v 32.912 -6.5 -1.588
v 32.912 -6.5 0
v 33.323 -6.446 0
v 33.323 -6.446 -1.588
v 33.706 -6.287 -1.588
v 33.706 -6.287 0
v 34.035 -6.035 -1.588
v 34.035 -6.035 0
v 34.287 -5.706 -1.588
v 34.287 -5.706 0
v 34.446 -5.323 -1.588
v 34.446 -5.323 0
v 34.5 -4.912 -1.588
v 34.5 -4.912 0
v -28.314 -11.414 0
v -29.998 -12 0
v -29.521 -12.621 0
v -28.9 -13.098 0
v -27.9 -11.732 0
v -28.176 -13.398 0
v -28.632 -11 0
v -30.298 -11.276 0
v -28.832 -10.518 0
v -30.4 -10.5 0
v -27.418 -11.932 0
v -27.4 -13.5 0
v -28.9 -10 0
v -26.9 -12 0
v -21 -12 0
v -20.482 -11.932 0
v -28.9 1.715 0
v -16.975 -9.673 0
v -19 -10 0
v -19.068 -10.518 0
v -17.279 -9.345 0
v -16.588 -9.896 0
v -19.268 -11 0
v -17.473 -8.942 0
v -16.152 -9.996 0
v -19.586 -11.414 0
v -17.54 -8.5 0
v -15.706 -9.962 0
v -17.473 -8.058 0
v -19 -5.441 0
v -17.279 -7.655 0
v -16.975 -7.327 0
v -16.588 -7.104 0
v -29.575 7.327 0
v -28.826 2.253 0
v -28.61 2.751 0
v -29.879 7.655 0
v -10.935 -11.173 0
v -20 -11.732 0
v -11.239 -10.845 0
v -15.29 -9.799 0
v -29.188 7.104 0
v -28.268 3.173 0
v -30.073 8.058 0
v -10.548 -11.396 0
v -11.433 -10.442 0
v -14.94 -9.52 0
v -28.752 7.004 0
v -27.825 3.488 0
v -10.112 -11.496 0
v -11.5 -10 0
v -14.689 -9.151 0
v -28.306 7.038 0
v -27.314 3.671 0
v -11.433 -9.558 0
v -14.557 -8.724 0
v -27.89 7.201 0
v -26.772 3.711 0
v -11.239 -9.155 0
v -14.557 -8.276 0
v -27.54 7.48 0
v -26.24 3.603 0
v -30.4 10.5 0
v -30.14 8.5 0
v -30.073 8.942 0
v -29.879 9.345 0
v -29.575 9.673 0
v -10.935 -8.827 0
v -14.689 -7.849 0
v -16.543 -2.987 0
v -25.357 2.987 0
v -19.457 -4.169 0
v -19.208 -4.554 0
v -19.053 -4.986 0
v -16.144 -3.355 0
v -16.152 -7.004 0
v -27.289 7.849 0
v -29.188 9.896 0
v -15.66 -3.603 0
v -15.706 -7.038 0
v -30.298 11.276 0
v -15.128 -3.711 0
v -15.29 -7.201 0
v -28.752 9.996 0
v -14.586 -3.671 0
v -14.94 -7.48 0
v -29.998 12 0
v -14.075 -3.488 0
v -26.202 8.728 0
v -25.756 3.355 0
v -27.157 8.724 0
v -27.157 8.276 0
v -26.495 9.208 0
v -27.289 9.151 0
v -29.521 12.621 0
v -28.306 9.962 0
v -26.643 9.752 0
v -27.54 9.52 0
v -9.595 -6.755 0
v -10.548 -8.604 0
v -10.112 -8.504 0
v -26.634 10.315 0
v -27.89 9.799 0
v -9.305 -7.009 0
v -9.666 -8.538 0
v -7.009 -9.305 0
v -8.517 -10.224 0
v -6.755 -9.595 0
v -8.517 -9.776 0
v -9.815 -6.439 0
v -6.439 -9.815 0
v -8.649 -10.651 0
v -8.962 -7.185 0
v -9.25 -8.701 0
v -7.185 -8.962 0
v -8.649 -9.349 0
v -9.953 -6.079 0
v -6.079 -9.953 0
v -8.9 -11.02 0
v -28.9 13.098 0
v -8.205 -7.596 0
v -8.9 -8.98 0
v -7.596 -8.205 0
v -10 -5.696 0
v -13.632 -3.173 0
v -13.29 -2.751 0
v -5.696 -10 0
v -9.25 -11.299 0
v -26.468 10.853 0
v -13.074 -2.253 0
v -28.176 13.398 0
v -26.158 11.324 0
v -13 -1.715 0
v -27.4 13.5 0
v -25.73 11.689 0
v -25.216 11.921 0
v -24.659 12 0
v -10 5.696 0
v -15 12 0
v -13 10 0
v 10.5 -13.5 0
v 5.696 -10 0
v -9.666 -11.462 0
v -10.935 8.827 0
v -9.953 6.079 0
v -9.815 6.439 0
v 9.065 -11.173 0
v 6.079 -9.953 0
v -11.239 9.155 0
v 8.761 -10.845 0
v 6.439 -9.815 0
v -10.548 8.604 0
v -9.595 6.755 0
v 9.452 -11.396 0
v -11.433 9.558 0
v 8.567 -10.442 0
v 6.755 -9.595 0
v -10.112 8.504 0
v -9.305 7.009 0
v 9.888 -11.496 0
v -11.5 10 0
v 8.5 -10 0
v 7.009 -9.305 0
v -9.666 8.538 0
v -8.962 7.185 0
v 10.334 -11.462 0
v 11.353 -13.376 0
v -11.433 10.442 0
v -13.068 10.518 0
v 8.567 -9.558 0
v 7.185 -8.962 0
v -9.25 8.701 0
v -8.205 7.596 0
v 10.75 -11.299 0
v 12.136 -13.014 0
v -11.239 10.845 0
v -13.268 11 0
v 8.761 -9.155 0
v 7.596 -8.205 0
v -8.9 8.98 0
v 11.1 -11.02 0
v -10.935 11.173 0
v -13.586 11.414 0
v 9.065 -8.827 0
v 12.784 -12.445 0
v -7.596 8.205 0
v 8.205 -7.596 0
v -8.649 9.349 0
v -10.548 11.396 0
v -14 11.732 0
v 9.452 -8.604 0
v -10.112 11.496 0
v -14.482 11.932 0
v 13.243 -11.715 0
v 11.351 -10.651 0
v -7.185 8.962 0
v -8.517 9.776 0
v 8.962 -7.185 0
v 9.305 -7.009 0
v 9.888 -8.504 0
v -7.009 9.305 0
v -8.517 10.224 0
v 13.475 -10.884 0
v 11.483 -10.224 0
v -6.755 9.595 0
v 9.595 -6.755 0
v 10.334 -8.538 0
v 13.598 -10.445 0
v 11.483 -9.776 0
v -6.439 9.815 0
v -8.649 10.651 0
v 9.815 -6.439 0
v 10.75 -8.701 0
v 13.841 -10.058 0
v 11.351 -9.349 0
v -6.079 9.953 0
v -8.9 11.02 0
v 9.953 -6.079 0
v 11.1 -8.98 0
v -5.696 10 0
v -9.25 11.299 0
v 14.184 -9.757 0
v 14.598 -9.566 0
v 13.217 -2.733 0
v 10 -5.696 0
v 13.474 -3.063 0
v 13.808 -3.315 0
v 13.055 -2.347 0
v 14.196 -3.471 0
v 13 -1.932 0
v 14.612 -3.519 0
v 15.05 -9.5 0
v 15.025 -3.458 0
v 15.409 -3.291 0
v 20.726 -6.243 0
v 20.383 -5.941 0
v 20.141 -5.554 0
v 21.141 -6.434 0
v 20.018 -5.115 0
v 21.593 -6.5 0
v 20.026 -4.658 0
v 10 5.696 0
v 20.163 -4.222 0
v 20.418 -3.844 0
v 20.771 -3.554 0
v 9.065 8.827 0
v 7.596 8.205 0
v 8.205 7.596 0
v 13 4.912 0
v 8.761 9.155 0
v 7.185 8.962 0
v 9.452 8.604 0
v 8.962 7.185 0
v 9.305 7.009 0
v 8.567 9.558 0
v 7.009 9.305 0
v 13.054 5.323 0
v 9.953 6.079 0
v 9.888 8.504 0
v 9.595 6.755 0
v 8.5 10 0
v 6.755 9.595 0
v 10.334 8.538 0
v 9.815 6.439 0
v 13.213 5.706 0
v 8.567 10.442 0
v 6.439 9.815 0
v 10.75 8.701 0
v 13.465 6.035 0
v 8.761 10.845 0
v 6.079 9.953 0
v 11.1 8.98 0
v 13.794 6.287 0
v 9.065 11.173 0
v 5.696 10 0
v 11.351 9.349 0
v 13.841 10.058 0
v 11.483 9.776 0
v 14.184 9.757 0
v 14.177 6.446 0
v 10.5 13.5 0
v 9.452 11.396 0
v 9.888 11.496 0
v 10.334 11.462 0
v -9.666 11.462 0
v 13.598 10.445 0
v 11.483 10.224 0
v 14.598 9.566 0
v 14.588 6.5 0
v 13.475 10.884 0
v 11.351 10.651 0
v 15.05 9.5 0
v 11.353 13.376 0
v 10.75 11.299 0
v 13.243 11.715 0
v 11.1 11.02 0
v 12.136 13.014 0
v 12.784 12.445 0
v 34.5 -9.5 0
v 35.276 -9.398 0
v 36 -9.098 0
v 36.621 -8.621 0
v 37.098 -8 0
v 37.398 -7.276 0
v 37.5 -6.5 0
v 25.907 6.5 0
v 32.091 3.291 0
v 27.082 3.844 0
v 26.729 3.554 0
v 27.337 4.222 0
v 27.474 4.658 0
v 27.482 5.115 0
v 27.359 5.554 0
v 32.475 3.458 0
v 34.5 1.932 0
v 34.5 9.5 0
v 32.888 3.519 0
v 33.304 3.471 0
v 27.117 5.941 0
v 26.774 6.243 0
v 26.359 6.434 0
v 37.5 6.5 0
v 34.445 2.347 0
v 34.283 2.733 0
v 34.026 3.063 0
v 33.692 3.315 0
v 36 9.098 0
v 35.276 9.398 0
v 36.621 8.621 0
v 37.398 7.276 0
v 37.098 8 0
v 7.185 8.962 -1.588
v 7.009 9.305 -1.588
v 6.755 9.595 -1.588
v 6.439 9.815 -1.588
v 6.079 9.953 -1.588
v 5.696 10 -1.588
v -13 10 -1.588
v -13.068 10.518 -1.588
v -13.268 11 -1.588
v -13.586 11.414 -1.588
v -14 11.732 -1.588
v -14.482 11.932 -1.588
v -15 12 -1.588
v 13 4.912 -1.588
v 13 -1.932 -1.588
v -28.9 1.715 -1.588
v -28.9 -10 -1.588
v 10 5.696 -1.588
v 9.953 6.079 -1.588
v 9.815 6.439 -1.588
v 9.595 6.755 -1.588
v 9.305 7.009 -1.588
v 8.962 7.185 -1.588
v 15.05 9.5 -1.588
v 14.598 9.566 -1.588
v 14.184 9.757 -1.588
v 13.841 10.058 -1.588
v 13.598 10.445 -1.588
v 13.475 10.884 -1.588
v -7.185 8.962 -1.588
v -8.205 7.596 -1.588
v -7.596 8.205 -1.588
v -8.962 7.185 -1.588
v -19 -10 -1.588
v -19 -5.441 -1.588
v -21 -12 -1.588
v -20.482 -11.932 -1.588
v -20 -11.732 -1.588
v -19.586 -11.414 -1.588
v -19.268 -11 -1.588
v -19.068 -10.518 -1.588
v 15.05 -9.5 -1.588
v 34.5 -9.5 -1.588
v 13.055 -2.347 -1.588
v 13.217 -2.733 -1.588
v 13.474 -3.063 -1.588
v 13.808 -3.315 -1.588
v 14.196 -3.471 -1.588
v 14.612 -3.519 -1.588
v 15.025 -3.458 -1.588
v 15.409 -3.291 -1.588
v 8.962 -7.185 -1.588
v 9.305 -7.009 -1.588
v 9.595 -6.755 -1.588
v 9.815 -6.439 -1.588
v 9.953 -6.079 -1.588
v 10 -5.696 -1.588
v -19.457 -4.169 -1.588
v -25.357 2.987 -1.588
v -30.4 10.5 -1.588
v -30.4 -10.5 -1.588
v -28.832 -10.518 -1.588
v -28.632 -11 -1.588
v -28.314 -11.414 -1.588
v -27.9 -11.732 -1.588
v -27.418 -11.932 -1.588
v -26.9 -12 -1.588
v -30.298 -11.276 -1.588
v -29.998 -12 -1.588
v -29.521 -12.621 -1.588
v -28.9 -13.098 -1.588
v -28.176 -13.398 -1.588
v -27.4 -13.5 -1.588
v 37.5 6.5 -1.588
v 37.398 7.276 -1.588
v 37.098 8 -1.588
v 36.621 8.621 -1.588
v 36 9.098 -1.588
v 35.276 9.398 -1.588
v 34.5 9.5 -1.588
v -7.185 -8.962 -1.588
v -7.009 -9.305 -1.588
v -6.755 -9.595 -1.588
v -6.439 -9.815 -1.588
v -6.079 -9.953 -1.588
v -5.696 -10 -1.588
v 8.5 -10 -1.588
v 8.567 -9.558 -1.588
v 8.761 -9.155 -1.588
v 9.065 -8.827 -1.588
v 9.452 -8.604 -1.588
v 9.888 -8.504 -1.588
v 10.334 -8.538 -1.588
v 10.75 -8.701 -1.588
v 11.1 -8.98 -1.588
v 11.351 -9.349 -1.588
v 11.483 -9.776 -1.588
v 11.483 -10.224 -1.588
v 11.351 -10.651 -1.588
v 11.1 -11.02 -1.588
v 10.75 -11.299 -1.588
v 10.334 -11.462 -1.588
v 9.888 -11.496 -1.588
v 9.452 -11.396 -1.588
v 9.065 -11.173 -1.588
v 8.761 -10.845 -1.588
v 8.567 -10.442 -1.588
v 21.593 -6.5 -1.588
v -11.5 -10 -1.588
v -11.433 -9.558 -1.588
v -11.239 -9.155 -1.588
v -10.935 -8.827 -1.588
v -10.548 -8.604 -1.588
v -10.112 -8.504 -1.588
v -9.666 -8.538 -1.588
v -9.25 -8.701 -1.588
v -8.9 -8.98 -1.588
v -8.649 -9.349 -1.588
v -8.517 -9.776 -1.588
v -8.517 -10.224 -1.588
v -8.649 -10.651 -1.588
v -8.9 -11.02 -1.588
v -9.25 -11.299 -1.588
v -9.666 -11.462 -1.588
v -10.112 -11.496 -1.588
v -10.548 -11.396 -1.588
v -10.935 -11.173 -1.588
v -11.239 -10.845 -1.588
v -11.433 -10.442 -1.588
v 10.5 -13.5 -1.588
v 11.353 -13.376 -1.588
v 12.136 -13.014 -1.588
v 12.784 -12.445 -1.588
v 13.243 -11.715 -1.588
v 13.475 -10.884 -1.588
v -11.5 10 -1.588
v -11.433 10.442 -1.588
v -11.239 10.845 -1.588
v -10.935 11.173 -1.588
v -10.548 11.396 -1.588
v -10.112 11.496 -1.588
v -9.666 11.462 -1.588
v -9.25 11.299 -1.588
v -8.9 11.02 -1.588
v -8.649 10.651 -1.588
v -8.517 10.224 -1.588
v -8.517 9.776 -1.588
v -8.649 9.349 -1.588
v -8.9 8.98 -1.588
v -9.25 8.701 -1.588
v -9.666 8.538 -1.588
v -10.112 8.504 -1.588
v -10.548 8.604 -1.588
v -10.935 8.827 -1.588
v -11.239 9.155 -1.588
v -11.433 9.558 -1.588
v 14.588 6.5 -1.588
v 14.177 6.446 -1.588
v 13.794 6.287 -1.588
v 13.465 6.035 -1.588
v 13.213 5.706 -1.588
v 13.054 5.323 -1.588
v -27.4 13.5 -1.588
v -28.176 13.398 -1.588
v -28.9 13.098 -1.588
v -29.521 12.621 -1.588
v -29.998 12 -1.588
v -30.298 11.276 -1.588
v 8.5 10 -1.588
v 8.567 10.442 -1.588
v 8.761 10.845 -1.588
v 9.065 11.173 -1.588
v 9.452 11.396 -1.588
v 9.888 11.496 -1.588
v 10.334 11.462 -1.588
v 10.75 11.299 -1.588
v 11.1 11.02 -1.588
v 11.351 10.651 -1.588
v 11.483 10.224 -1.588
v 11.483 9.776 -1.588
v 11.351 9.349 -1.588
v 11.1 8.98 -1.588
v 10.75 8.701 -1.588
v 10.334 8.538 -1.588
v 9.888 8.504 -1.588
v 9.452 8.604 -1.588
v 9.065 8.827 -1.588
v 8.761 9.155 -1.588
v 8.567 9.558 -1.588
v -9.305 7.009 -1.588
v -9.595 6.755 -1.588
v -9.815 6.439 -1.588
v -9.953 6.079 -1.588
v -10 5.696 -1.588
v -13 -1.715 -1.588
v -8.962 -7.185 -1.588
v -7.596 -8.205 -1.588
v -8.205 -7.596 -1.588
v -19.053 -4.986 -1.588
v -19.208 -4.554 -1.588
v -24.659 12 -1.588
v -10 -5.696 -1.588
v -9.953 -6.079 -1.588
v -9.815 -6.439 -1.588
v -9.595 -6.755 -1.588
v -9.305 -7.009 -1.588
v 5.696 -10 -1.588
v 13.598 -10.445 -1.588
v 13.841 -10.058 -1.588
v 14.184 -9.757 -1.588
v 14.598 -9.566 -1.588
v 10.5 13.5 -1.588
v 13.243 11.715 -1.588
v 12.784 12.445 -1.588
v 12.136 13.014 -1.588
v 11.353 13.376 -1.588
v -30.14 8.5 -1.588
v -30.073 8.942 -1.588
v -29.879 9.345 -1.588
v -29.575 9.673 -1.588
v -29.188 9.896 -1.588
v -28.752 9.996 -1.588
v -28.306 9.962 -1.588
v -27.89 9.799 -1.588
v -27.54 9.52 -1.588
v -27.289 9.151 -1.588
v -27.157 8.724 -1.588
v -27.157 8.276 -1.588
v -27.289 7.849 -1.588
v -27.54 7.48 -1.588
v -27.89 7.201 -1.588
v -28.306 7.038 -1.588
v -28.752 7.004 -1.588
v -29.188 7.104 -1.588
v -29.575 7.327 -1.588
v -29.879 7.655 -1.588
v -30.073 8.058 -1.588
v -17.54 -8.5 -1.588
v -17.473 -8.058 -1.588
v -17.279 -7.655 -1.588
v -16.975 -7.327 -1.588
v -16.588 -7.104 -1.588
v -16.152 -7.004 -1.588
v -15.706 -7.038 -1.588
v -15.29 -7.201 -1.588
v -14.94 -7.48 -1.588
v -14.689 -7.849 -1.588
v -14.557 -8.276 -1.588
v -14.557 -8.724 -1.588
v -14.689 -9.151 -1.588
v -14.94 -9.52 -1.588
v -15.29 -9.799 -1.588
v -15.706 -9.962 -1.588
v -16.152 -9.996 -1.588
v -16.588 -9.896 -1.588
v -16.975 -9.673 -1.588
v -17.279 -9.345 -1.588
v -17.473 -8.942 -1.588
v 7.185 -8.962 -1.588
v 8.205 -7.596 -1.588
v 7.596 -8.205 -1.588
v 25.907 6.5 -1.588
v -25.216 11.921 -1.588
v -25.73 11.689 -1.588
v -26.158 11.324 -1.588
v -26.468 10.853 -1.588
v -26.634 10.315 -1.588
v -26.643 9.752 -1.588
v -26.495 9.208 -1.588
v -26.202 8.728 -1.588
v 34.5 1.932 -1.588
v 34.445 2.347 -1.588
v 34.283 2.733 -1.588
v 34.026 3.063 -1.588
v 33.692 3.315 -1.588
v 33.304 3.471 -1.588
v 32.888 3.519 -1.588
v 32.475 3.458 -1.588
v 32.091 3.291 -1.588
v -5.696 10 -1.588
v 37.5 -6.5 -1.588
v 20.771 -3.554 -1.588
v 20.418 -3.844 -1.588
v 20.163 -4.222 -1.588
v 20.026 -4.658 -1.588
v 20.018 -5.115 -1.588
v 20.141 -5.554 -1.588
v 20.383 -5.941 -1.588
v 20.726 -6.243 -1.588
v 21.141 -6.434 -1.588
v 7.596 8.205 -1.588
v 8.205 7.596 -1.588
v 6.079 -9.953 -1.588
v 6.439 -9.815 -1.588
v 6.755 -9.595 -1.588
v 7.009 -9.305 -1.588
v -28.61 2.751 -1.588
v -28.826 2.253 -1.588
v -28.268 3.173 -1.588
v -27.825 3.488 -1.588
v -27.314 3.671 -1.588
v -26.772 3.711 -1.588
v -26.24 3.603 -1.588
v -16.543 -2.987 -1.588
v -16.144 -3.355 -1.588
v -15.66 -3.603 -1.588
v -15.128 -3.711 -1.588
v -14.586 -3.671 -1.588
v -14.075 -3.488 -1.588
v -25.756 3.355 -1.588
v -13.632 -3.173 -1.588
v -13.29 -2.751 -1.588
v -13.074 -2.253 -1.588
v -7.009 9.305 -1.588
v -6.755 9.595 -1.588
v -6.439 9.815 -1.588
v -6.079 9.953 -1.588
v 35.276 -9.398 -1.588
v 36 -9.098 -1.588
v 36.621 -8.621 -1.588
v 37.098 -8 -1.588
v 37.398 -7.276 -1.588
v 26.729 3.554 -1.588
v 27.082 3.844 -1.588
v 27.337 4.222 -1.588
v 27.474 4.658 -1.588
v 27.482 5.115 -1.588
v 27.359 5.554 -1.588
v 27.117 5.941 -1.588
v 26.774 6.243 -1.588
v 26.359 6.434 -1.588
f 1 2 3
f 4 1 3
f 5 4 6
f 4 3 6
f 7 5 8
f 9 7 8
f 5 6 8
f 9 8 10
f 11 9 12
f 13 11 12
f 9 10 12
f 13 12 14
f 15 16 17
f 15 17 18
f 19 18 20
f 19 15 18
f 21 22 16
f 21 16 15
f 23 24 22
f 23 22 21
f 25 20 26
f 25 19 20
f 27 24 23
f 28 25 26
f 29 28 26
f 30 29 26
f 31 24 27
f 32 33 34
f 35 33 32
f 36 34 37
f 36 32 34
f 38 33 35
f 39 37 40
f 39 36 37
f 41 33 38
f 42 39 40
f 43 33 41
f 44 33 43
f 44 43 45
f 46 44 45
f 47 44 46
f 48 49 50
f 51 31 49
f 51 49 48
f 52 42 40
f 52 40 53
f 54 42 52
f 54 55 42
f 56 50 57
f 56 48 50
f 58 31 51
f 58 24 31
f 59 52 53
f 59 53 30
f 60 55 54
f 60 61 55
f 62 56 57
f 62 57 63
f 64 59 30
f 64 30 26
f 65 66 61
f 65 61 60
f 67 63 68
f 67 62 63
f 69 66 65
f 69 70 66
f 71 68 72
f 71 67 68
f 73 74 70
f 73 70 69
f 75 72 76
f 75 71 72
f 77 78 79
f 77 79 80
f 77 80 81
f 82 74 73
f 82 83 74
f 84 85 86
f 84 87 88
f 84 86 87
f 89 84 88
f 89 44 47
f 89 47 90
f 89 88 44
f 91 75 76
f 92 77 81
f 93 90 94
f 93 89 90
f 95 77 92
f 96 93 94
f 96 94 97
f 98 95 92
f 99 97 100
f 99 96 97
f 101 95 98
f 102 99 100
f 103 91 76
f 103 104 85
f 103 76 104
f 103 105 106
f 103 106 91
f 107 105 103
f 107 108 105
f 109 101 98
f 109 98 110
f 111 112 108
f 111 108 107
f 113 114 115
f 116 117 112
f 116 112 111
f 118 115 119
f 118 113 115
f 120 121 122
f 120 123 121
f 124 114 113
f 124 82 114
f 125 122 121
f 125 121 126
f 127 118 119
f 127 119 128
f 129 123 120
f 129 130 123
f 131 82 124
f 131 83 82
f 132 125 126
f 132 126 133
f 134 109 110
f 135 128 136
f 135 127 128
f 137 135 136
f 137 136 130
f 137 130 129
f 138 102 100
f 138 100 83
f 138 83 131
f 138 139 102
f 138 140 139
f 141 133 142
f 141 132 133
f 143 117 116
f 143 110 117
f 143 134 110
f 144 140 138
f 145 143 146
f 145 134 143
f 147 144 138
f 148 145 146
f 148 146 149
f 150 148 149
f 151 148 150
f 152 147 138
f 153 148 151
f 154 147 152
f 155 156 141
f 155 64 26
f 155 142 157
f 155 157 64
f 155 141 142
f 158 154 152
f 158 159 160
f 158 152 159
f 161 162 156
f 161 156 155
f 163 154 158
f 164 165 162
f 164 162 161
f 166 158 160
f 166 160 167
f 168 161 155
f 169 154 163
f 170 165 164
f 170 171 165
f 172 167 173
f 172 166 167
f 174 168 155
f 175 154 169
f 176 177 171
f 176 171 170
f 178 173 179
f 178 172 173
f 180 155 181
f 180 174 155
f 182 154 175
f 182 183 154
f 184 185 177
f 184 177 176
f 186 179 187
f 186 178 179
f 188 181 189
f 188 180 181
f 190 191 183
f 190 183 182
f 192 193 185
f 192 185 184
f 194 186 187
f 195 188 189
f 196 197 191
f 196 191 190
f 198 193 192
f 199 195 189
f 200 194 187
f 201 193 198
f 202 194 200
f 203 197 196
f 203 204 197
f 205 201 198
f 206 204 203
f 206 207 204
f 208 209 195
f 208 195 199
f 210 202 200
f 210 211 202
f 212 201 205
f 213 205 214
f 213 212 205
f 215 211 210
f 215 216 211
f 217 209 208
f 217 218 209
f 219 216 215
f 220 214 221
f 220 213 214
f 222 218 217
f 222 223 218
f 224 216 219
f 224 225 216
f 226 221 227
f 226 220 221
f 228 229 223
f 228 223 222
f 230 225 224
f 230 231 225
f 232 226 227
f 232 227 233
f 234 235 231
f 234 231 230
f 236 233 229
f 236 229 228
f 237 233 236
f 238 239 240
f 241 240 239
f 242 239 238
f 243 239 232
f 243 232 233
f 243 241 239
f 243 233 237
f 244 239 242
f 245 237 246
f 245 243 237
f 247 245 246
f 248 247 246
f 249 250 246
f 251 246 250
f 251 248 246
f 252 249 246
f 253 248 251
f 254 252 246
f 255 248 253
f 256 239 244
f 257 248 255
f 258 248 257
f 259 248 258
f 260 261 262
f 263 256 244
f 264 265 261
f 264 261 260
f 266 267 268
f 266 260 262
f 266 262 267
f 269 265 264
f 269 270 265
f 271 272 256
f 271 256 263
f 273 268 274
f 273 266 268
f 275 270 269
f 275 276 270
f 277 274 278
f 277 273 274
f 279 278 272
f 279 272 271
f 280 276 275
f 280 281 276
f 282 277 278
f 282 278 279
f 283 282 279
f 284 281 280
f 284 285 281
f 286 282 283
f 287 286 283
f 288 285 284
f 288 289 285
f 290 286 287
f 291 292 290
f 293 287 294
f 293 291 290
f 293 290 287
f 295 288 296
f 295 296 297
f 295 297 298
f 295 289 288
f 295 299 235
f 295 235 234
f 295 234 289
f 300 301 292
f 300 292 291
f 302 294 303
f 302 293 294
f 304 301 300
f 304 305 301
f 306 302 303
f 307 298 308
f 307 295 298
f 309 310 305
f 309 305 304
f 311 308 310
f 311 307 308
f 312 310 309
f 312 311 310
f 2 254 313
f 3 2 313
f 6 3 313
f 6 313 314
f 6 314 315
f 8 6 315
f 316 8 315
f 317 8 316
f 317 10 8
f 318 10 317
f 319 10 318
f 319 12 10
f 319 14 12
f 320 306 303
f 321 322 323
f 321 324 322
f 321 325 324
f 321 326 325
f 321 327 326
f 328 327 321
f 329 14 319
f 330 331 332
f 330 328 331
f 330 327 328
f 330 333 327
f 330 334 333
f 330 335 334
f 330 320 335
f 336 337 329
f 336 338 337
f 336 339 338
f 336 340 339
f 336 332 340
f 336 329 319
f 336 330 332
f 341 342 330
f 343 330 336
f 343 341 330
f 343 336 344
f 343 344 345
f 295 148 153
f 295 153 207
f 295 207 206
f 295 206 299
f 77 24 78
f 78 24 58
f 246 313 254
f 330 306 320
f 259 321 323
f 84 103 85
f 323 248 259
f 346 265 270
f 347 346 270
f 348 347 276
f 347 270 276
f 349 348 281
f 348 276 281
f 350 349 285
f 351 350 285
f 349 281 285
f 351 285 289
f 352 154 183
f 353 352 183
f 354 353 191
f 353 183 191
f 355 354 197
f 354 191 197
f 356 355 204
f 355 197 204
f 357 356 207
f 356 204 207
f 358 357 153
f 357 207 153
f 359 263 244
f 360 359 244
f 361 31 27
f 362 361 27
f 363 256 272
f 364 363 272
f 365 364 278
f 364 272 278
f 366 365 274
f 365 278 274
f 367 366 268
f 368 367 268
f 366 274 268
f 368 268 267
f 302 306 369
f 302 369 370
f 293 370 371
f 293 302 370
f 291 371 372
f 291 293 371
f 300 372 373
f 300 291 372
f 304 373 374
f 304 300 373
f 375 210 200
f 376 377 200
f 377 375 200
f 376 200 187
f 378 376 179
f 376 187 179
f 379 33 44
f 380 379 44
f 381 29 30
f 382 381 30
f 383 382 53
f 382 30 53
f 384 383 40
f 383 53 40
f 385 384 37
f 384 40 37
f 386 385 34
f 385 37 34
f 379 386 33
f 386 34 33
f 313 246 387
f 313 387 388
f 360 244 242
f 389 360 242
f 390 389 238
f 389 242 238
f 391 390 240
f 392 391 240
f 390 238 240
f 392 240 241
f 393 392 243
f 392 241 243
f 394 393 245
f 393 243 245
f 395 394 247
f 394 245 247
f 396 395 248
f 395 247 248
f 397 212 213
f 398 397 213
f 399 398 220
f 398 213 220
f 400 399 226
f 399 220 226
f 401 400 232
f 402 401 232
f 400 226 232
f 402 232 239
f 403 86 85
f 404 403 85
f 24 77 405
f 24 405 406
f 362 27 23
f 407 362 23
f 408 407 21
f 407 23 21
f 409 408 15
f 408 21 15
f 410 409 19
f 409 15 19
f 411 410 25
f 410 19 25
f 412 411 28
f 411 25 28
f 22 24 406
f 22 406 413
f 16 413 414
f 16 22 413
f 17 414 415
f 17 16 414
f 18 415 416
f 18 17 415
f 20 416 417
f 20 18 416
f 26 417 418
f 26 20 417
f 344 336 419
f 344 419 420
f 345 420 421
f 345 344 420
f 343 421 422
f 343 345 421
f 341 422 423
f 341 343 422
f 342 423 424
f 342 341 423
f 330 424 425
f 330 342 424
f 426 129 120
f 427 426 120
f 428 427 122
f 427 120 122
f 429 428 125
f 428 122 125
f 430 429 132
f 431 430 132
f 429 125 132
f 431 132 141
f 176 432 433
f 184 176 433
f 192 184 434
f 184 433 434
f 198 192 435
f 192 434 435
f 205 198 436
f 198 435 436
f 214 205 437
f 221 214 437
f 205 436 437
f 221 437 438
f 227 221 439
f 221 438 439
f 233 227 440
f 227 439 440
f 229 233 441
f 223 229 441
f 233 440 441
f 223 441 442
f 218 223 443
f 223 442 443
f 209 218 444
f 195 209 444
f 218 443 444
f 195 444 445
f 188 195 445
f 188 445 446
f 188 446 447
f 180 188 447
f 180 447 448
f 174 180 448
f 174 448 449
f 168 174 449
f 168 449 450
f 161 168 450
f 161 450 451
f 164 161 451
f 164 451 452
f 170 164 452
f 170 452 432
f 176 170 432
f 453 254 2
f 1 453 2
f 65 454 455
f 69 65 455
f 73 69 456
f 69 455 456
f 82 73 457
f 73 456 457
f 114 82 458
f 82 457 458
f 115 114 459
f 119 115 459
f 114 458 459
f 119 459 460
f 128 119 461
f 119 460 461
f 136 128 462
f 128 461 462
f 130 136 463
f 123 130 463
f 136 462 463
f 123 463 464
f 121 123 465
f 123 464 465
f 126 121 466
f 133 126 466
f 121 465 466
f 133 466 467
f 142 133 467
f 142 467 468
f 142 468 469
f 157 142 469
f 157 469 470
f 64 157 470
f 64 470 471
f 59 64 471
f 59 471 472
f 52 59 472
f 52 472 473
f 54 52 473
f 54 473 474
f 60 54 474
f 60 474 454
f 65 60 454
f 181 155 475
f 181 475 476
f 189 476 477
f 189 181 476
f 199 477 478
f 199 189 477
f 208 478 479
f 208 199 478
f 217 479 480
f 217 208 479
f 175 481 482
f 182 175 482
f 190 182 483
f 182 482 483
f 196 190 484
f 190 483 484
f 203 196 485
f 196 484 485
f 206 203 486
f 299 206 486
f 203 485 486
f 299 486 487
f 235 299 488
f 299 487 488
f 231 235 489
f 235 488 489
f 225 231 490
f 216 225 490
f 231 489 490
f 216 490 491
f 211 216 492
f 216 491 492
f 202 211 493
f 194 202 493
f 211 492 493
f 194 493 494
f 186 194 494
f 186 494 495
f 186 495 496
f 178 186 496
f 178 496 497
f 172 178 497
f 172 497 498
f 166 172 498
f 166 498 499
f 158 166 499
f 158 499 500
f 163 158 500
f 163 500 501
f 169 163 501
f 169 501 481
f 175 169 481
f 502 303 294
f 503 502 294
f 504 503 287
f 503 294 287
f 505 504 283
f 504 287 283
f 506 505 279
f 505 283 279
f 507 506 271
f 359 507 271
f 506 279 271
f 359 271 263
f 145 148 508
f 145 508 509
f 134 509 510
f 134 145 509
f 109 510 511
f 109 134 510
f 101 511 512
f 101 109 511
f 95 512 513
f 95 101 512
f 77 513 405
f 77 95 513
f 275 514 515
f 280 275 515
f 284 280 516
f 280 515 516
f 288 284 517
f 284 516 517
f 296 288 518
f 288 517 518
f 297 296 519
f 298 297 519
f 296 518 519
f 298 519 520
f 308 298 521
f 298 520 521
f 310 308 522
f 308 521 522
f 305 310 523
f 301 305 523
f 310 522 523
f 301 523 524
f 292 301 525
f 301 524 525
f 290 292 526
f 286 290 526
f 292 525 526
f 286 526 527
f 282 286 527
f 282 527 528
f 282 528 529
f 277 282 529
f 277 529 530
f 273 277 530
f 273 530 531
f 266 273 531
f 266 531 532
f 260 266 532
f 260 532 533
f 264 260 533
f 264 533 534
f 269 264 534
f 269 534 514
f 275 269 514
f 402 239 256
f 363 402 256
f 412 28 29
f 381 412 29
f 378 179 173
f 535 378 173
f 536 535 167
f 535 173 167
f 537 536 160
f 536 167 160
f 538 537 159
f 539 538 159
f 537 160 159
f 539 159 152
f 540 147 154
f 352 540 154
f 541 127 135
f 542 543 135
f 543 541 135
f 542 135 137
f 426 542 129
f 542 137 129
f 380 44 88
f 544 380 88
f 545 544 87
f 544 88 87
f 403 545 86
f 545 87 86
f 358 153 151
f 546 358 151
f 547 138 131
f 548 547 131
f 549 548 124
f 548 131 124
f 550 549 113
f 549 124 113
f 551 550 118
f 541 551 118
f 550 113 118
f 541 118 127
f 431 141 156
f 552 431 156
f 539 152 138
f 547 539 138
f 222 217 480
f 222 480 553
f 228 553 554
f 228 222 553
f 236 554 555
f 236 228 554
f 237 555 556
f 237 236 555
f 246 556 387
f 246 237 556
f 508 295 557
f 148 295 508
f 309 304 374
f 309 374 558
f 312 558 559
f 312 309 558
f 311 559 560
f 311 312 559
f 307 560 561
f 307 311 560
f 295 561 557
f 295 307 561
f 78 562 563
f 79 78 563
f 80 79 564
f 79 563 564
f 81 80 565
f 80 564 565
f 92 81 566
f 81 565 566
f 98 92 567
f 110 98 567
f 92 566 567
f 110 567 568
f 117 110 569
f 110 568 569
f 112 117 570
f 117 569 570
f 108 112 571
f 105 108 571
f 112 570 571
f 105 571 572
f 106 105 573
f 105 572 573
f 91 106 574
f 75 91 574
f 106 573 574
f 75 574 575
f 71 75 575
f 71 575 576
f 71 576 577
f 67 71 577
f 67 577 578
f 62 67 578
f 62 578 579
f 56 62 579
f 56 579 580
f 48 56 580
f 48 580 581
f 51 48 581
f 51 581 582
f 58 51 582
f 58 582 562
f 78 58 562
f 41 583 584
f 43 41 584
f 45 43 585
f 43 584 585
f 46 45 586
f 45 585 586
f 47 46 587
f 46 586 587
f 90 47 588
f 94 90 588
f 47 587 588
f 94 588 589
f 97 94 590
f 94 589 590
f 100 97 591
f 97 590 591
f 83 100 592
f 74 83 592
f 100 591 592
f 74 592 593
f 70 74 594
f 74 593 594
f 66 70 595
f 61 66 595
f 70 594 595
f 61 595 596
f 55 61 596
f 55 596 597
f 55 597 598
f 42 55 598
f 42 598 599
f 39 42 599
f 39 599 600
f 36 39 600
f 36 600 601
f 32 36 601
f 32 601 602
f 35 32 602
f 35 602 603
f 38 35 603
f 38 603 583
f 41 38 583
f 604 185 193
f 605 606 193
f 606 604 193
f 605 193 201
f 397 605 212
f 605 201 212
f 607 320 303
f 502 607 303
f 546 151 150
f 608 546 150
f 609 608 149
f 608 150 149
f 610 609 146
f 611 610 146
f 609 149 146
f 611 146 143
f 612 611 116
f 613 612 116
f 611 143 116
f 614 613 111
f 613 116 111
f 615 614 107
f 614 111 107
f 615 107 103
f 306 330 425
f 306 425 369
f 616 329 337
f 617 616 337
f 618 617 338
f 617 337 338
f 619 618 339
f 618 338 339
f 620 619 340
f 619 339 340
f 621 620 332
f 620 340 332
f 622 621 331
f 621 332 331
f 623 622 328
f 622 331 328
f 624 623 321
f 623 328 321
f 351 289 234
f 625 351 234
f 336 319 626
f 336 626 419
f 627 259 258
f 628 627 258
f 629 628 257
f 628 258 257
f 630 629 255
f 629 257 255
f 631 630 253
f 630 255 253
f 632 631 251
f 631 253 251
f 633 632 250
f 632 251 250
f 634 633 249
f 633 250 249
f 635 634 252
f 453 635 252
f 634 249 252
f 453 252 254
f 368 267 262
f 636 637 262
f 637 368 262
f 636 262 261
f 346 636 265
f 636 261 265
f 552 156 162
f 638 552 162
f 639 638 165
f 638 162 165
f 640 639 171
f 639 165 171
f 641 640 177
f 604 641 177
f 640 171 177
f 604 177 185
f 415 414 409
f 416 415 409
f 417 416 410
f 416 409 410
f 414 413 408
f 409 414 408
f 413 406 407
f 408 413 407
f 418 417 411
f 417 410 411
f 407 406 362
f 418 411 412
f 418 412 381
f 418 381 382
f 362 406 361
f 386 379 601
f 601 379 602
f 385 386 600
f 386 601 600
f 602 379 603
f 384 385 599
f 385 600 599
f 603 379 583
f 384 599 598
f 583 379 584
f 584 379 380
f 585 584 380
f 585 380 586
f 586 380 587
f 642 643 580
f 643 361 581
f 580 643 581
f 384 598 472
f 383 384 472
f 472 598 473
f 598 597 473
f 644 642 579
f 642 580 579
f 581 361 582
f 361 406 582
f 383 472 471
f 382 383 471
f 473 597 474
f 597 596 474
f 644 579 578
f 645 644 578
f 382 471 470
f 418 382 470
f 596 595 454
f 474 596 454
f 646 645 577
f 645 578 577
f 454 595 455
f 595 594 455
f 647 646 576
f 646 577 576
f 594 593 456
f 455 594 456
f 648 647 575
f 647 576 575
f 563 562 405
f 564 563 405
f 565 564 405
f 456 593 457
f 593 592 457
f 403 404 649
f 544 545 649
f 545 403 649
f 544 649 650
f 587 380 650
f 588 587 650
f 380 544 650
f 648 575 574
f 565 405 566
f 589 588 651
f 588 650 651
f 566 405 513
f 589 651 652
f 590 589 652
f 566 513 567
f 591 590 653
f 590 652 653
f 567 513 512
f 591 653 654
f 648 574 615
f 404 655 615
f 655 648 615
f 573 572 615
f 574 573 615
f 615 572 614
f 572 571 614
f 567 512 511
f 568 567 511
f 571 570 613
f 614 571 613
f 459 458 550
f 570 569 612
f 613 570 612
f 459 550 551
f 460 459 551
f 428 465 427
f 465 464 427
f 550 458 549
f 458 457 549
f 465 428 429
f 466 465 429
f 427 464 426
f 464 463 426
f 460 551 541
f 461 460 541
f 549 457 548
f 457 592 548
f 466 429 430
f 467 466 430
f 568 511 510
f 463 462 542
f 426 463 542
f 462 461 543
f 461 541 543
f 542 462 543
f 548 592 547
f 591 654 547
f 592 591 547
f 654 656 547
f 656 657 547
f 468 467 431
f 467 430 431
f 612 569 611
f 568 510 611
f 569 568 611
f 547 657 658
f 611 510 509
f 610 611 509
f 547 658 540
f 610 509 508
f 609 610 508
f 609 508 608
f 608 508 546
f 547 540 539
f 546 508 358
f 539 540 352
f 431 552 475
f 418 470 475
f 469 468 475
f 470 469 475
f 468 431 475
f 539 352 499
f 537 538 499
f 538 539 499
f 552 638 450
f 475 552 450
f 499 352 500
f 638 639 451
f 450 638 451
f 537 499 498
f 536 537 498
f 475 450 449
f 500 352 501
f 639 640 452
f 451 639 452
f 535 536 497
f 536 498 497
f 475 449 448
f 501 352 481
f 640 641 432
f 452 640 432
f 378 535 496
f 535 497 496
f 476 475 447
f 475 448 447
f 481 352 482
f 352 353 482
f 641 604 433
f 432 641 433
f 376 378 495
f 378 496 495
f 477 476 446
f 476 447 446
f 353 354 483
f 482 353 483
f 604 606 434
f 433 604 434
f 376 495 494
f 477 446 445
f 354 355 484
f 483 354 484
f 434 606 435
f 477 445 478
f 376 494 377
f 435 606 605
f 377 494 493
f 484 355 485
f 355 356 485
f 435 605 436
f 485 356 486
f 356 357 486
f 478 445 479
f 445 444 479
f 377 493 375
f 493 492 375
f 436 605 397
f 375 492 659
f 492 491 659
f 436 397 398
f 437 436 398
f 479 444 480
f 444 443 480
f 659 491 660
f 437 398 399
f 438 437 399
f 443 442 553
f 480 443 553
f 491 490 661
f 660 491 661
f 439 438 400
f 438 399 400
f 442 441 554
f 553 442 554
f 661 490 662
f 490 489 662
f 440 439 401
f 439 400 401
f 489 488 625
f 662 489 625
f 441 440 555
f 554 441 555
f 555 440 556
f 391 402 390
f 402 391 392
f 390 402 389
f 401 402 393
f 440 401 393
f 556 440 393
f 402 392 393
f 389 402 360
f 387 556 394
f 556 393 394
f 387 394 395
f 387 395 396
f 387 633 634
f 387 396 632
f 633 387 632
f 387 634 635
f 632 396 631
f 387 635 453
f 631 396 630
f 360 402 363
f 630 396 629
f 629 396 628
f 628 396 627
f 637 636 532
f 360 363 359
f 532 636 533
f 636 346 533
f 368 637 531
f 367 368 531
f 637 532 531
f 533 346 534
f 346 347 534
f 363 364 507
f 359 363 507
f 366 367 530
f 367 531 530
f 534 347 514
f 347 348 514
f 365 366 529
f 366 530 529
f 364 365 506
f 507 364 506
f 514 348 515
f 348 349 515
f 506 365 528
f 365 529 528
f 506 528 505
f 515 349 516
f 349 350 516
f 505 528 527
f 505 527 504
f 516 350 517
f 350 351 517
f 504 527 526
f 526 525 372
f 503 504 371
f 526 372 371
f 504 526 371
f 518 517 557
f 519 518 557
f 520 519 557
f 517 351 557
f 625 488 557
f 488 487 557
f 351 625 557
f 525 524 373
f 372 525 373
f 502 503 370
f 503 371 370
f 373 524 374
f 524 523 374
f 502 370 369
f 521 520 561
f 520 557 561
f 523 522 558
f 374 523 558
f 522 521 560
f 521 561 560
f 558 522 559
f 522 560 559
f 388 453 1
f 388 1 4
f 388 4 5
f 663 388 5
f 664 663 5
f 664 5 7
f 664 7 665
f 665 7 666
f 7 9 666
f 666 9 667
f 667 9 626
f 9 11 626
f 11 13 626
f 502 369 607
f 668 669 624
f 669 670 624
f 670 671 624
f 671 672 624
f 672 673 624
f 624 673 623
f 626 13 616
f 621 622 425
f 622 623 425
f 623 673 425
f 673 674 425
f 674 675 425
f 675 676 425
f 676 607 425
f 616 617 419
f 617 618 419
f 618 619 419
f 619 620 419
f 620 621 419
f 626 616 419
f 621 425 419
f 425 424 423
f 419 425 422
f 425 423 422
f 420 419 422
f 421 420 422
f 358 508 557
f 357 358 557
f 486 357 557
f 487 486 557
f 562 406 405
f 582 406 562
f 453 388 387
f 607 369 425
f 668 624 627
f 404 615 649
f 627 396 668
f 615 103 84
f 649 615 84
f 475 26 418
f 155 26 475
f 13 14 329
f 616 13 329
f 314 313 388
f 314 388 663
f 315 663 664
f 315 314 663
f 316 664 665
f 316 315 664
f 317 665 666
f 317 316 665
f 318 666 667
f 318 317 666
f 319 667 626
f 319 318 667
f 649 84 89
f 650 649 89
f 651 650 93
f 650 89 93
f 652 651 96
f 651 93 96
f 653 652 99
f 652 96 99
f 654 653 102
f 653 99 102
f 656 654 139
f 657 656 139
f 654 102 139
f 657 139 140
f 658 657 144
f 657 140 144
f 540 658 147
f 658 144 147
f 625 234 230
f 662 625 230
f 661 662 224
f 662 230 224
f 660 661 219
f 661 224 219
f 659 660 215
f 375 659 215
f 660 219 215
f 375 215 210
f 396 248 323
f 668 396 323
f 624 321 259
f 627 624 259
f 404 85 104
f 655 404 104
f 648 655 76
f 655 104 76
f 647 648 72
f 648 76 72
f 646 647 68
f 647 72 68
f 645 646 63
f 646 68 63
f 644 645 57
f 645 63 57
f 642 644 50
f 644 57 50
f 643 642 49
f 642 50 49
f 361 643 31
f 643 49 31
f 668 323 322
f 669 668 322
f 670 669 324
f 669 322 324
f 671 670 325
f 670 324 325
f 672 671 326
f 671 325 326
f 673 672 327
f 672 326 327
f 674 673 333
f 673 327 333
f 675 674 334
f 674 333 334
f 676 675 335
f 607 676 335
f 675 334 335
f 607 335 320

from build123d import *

# Parameters (mm, degrees)
F1_DEPTH = 1.5875
F2_D     = 3
F2_DEPTH = 5
F3_D     = 3
F3_DEPTH = 5
F5_DEPTH = 25
F7_DEPTH = 25
F9_DEPTH = 25


with BuildPart() as f1:
    # F0 (on Top) → F1 (new body)
    with BuildSketch(Plane.XY):
        with BuildLine():
            Line((10.5, 13.5), (-13.5, 13.5))
            Line((-13.5, 13.5), (-27.4, 13.5))
            ThreePointArc((-27.4, 13.5), (-29.52132, 12.62132), (-30.4, 10.5))
            Line((-30.4, 10.5), (-30.4, -10.5))
            ThreePointArc((-30.4, -10.5), (-29.52132, -12.62132), (-27.4, -13.5))
            Line((-27.4, -13.5), (-13.5, -13.5))
            Line((-13.5, -13.5), (10.5, -13.5))
            ThreePointArc((10.5, -13.5), (12.480835, -12.753063), (13.475297, -10.884196))
            ThreePointArc((13.475297, -10.884196), (14.001534, -9.895254), (15.049725, -9.5))
            Line((15.049725, -9.5), (34.5, -9.5))
            ThreePointArc((34.5, -9.5), (36.62132, -8.62132), (37.5, -6.5))
            Line((37.5, -6.5), (37.5, 6.5))
            ThreePointArc((37.5, 6.5), (36.62132, 8.62132), (34.5, 9.5))
            Line((34.5, 9.5), (15.049725, 9.5))
            ThreePointArc((15.049725, 9.5), (14.001534, 9.895254), (13.475297, 10.884196))
            ThreePointArc((13.475297, 10.884196), (12.480835, 12.753063), (10.5, 13.5))
        make_face()
    extrude(amount=-F1_DEPTH)

    # F2
    with Locations(Plane.XY):
        with Locations((-10, 10), (10, 10), (10, -10), (-10, -10)):
            Hole(F2_D / 2, depth=F2_DEPTH)

    # F3
    with Locations(Plane.XY):
        with Locations((-28.64, 8.5), (-16.04, -8.5)):
            Hole(F3_D / 2, depth=F3_DEPTH)

    # F4 (on face) → F5 (cut)
    with BuildSketch(Plane.XY):
        with BuildLine():
            Line((5.695932, 10), (-5.695932, 10))
            ThreePointArc((-5.695932, 10), (-6.603693, 9.714854), (-7.185351, 8.961853))
            ThreePointArc((-7.185351, 8.961853), (-7.87868, 7.87868), (-8.961853, 7.185351))
            ThreePointArc((-8.961853, 7.185351), (-9.714854, 6.603693), (-10, 5.695932))
            Line((-10, 5.695932), (-10, -5.695932))
            ThreePointArc((-10, -5.695932), (-9.714854, -6.603693), (-8.961853, -7.185351))
            ThreePointArc((-8.961853, -7.185351), (-7.87868, -7.87868), (-7.185351, -8.961853))
            ThreePointArc((-7.185351, -8.961853), (-6.603693, -9.714854), (-5.695932, -10))
            Line((-5.695932, -10), (5.695932, -10))
            ThreePointArc((5.695932, -10), (6.603693, -9.714854), (7.185351, -8.961853))
            ThreePointArc((7.185351, -8.961853), (7.87868, -7.87868), (8.961853, -7.185351))
            ThreePointArc((8.961853, -7.185351), (9.714854, -6.603693), (10, -5.695932))
            Line((10, -5.695932), (10, 5.695932))
            ThreePointArc((10, 5.695932), (9.714854, 6.603693), (8.961853, 7.185351))
            ThreePointArc((8.961853, 7.185351), (7.87868, 7.87868), (7.185351, 8.961853))
            ThreePointArc((7.185351, 8.961853), (6.603693, 9.714854), (5.695932, 10))
        make_face()
    extrude(amount=-F5_DEPTH, mode=Mode.SUBTRACT)

    # F6 (on face) → F7 (cut)
    with BuildSketch(Plane.XY):
        with BuildLine():
            Line((-15, 12), (-24.658826, 12))
            ThreePointArc((-24.658826, 12), (-26.467781, 10.853044), (-26.201944, 8.727684))
            Line((-26.201944, 8.727684), (-16.543118, -2.986947))
            ThreePointArc((-16.543118, -2.986947), (-14.324069, -3.596948), (-13, -1.714631))
            Line((-13, -1.714631), (-13, 10))
            ThreePointArc((-13, 10), (-13.585786, 11.414214), (-15, 12))
        make_face()
        with BuildLine():
            Line((-19.456882, -4.168822), (-25.356882, 2.986947))
            ThreePointArc((-25.356882, 2.986947), (-27.575931, 3.596948), (-28.9, 1.714631))
            Line((-28.9, 1.714631), (-28.9, -10))
            ThreePointArc((-28.9, -10), (-28.314214, -11.414214), (-26.9, -12))
            Line((-26.9, -12), (-21, -12))
            ThreePointArc((-21, -12), (-19.585786, -11.414214), (-19, -10))
            Line((-19, -10), (-19, -5.441137))
            ThreePointArc((-19, -5.441137), (-19.117683, -4.765207), (-19.456882, -4.168822))
        make_face()
    extrude(amount=-F7_DEPTH, mode=Mode.SUBTRACT)

    # F8 (on face) → F9 (cut)
    with BuildSketch(Plane.XY):
        with BuildLine():
            ThreePointArc((26.728809, 3.554025), (27.436578, 5.338867), (25.907406, 6.5))
            Line((25.907406, 6.5), (14.5875, 6.5))
            ThreePointArc((14.5875, 6.5), (13.464968, 6.035032), (13, 4.9125))
            Line((13, 4.9125), (13, -1.932094))
            ThreePointArc((13, -1.932094), (13.807699, -3.314869), (15.408903, -3.290569))
            Line((15.408903, -3.290569), (26.728809, 3.554025))
        make_face()
        with BuildLine():
            Line((21.592594, -6.5), (32.9125, -6.5))
            ThreePointArc((32.9125, -6.5), (34.035032, -6.035032), (34.5, -4.9125))
            Line((34.5, -4.9125), (34.5, 1.932094))
            ThreePointArc((34.5, 1.932094), (33.692301, 3.314869), (32.091097, 3.290569))
            Line((32.091097, 3.290569), (20.771191, -3.554025))
            ThreePointArc((20.771191, -3.554025), (20.063422, -5.338867), (21.592594, -6.5))
        make_face()
    extrude(amount=-F9_DEPTH, mode=Mode.SUBTRACT)


solid = f1.part
